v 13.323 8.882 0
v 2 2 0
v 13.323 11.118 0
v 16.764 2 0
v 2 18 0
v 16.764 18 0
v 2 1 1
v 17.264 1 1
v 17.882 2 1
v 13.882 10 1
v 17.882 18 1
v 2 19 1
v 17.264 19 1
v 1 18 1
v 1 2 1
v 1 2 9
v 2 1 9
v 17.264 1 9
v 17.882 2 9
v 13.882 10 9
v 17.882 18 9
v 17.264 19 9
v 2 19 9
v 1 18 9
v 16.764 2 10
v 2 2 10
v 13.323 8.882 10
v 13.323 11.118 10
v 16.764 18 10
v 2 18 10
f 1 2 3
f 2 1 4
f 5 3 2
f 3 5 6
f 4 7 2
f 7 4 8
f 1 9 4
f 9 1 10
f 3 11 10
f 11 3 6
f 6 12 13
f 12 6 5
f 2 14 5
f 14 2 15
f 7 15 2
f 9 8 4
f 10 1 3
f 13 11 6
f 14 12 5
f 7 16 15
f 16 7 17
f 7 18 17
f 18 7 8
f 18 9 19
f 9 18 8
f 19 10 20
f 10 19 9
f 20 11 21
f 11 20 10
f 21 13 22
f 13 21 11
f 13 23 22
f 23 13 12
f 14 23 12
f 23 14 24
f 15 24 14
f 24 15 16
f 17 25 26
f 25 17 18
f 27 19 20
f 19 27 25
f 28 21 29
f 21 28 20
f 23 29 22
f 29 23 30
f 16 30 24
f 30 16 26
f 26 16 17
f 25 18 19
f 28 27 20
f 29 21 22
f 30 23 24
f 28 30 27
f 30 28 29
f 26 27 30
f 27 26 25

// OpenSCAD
// file: ../functions/vectors2D.scad
/* * * * * * * * * * * * * * * * * * * * * * * * * * * * * * * * * * * * *\
 * Copyright (C) Claus Schrammel <claus@f05fk.net>                       *
 *                                                                       *
 * This program is free software: you can redistribute it and/or modify  *
 * it under the terms of the GNU General Public License as published by  *
 * the Free Software Foundation, either version 3 of the License, or     *
 * (at your option) any later version.                                   *
 *                                                                       *
 * This program is distributed in the hope that it will be useful,       *
 * but WITHOUT ANY WARRANTY; without even the implied warranty of        *
 * MERCHANTABILITY or FITNESS FOR A PARTICULAR PURPOSE.  See the         *
 * GNU General Public License for more details.                          *
 *                                                                       *
 * You should have received a copy of the GNU General Public License     *
 * along with this program.  If not, see <http://www.gnu.org/licenses/>. *
 *                                                                       *
 * SPDX-License-Identifier: GPL-3.0-or-later                             *
\* * * * * * * * * * * * * * * * * * * * * * * * * * * * * * * * * * * * */

include <utils.scad>

function normal_vector_2D(vector) = [-vector.y, vector.x];
function unit_vector_2D(vector) = vector / norm(vector);

/*
 * Calculates the coefficient for v1 to get from p1 to the intersection point of the two lines p1/v1 and p2/v2:
 * intersection_point = p1 + v1 * intersection_coefficient1.
 */
function intersection_coefficient1(p1, v1, p2, v2) = ( v2.x * (p1.y - p2.y) - v2.y * (p1.x - p2.x) ) / (v1.x * v2.y - v1.y * v2.x);

/*
 * Calculates the coefficient for v2 to get from p2 to the intersection point of the two lines p1/v1 and p2/v2:
 * intersection_point = p2 + v2 * intersection_coefficient2.
 */
function intersection_coefficient2(p1, v1, p2, v2) = intersection_coefficient1(p2, v2, p1, v1);

/*
 * Calculates the intersection point of the two lines p1/v1 and p2/v2.
 */
function intersection_point(p1, v1, p2, v2) = p1 + v1 * intersection_coefficient1(p1, v1, p2, v2);
// file: ../functions/utils.scad
/* * * * * * * * * * * * * * * * * * * * * * * * * * * * * * * * * * * * *\
 * Copyright (C) Claus Schrammel <claus@f05fk.net>                       *
 *                                                                       *
 * This program is free software: you can redistribute it and/or modify  *
 * it under the terms of the GNU General Public License as published by  *
 * the Free Software Foundation, either version 3 of the License, or     *
 * (at your option) any later version.                                   *
 *                                                                       *
 * This program is distributed in the hope that it will be useful,       *
 * but WITHOUT ANY WARRANTY; without even the implied warranty of        *
 * MERCHANTABILITY or FITNESS FOR A PARTICULAR PURPOSE.  See the         *
 * GNU General Public License for more details.                          *
 *                                                                       *
 * You should have received a copy of the GNU General Public License     *
 * along with this program.  If not, see <http://www.gnu.org/licenses/>. *
 *                                                                       *
 * SPDX-License-Identifier: GPL-3.0-or-later                             *
\* * * * * * * * * * * * * * * * * * * * * * * * * * * * * * * * * * * * */

// the modulo operator % creates negative results for negative inputs n
function modulo(n, m) = ((n % m) + m) % m;

function cyclic_array(array, index) = array[modulo(index, len(array))];
// file: ../functions/polygons.scad
/* * * * * * * * * * * * * * * * * * * * * * * * * * * * * * * * * * * * *\
 * Copyright (C) Claus Schrammel <claus@f05fk.net>                       *
 *                                                                       *
 * This program is free software: you can redistribute it and/or modify  *
 * it under the terms of the GNU General Public License as published by  *
 * the Free Software Foundation, either version 3 of the License, or     *
 * (at your option) any later version.                                   *
 *                                                                       *
 * This program is distributed in the hope that it will be useful,       *
 * but WITHOUT ANY WARRANTY; without even the implied warranty of        *
 * MERCHANTABILITY or FITNESS FOR A PARTICULAR PURPOSE.  See the         *
 * GNU General Public License for more details.                          *
 *                                                                       *
 * You should have received a copy of the GNU General Public License     *
 * along with this program.  If not, see <http://www.gnu.org/licenses/>. *
 *                                                                       *
 * SPDX-License-Identifier: GPL-3.0-or-later                             *
\* * * * * * * * * * * * * * * * * * * * * * * * * * * * * * * * * * * * */

include <utils.scad>
include <vectors2D.scad>

/*
 * Shrinks the polygon by moving the edges "inwards" by the given distance.
 * The points need to be given in the counter-clockwise order, i.e. applying the
 * right-hand rule with the thumb pointing in the z direction.
 */
function shrink_edges(points, distance) =
    [ for (i = [0 : 1 : len(points) - 1])
        let (p1 = cyclic_array(points, i - 1), p2 = cyclic_array(points, i), p3 = cyclic_array(points, i + 1),
                v1 = p2 - p1, v2 = p3 - p2,
                n1 = unit_vector_2D(normal_vector_2D(v1)), n2 = unit_vector_2D(normal_vector_2D(v2)))
            intersection_point(p1 + n1 * distance, v1, p2 + n2 * distance, v2)
    ];

/*
 * Grows the polygon by moving the edges "outwards" by the given distance.
 * The points need to be given in the counter-clockwise order, i.e. applying the
 * right-hand rule with the thumb pointing in the z direction.
 */
function grow_edges(points, distance) = shrink_edges(points, -distance);

/*
 * Flattens the corners of the polygon by cutting off at the intersection points where one of the edges
 * is moved "inwards" by the given distance, while the other edge is not, and vice-versa.
 * The points need to be given in the counter-clockwise order, i.e. applying the
 * right-hand rule with the thumb pointing in the z direction.
 */
function flatten_corners(points, distance) = 
    [ for (i = [0 : 1 : len(points) - 1])
        let (p1 = cyclic_array(points, i - 1), p2 = cyclic_array(points, i), p3 = cyclic_array(points, i + 1),
                v1 = p2 - p1, v2 = p3 - p2,
                n1 = unit_vector_2D(normal_vector_2D(v1)), n2 = unit_vector_2D(normal_vector_2D(v2)))
            each [
                intersection_point(p1, v1, p2 + n2 * distance, v2),
                intersection_point(p1 + n1 * distance, v1, p2, v2)
            ]
    ];
// main file
/* * * * * * * * * * * * * * * * * * * * * * * * * * * * * * * * * * * * *\
 * Copyright (C) Claus Schrammel <claus@f05fk.net>                       *
 *                                                                       *
 * This program is free software: you can redistribute it and/or modify  *
 * it under the terms of the GNU General Public License as published by  *
 * the Free Software Foundation, either version 3 of the License, or     *
 * (at your option) any later version.                                   *
 *                                                                       *
 * This program is distributed in the hope that it will be useful,       *
 * but WITHOUT ANY WARRANTY; without even the implied warranty of        *
 * MERCHANTABILITY or FITNESS FOR A PARTICULAR PURPOSE.  See the         *
 * GNU General Public License for more details.                          *
 *                                                                       *
 * You should have received a copy of the GNU General Public License     *
 * along with this program.  If not, see <http://www.gnu.org/licenses/>. *
 *                                                                       *
 * SPDX-License-Identifier: GPL-3.0-or-later                             *
\* * * * * * * * * * * * * * * * * * * * * * * * * * * * * * * * * * * * */

include <../functions/polygons.scad>

points = [[0, 0], [20, 0], [15, 10], [20, 20], [0, 20]];

PrismaChamfered(points = shrink_edges(points, 1), height = 10, chamfer = 1, invert_bottom = false, invert_middle = false, invert_top = false);

module PrismaChamfered(points, height, chamfer, invert_bottom = false, invert_middle = false, invert_top = false) {
    data = generate_data(points, chamfer, invert_bottom, invert_middle, invert_top);
    indexes = calculate_indexes(data);
    polyhedron(generate_poly_points(data, height, chamfer), generate_poly_faces(data, indexes), convexity = 10);
}

function generate_data(points, chamfer, invert_bottom = false, invert_middle = false, invert_top = false) = 
    [ for (i = [0 : 1 : len(points) - 1])
        let (p1 = cyclic_array(points, i - 1), p2 = cyclic_array(points, i), p3 = cyclic_array(points, i + 1),
                v1 = p2 - p1, v2 = p3 - p2,
                n1 = unit_vector_2D(normal_vector_2D(v1)), n2 = unit_vector_2D(normal_vector_2D(v2)),
                convex = cross(n1, n2))
        [

            // bottom

            if (convex > 0)
                if (invert_bottom)
                    if (intersection_coefficient1(p2,  v2, p1 - n1 * chamfer, v1) > -0.5 &&
                        intersection_coefficient1(p2, -v1, p2 - n2 * chamfer, v2) > -0.5)
                        [
                            intersection_point(p1 - n1 * chamfer, v1, p2,                v2),
                            intersection_point(p1,                v1, p2 - n2 * chamfer, v2),
                        ]
                    else
                        [
                            intersection_point(p1 - n1 * chamfer, v1, p2 - n2 * chamfer, v2),
                        ]
                else
                    [
                        intersection_point(p1 + n1 * chamfer, v1, p2 + n2 * chamfer, v2),
                    ]
            else // if (convex < 0)
                if (invert_bottom)
                    [
                        intersection_point(p1 - n1 * chamfer, v1, p2 - n2 * chamfer, v2),
                    ]
                else
                    if (intersection_coefficient1(p2,  v2, p1 + n1 * chamfer, v1) > -0.5 &&
                        intersection_coefficient1(p2, -v1, p2 + n2 * chamfer, v2) > -0.5)
                        [
                            intersection_point(p1 + n1 * chamfer, v1, p2,                v2),
                            intersection_point(p1,                v1, p2 + n2 * chamfer, v2),
                        ]
                    else
                        [
                            intersection_point(p1 + n1 * chamfer, v1, p2 + n2 * chamfer, v2),
                        ]
            ,

            // middle

            if (convex > 0 && !invert_middle
                    && intersection_coefficient1(p2, -v1, p2 + n2 * chamfer, v2) < 0.25
                    && intersection_coefficient1(p2,  v2, p1 + n1 * chamfer, v1) < 0.25)
                [
                    intersection_point(p1,                v1, p2 + n2 * chamfer, v2),
                    intersection_point(p1 + n1 * chamfer, v1, p2,                v2),
                ]
            else if (convex < 0 && invert_middle
                    && intersection_coefficient1(p2, -v1, p2 - n2 * chamfer, v2) < 0.25
                    && intersection_coefficient1(p2,  v2, p1 - n1 * chamfer, v1) < 0.25)
                [
                    intersection_point(p1,                v1, p2 - n2 * chamfer, v2),
                    intersection_point(p1 - n1 * chamfer, v1, p2,                v2),
                ]
            else
                [
                    intersection_point(p1,                v1, p2,                v2),
                ]
            ,

            // top

            if (convex > 0)
                if (invert_top)
                    if (intersection_coefficient1(p2,  v2, p1 - n1 * chamfer, v1) > -0.5 &&
                        intersection_coefficient1(p2, -v1, p2 - n2 * chamfer, v2) > -0.5)
                        [
                            intersection_point(p1 - n1 * chamfer, v1, p2,                v2),
                            intersection_point(p1,                v1, p2 - n2 * chamfer, v2),
                        ]
                    else
                        [
                            intersection_point(p1 - n1 * chamfer, v1, p2 - n2 * chamfer, v2),
                        ]
                else
                    [
                        intersection_point(p1 + n1 * chamfer, v1, p2 + n2 * chamfer, v2),
                    ]
            else // if (convex < 0)
                if (invert_top)
                    [
                        intersection_point(p1 - n1 * chamfer, v1, p2 - n2 * chamfer, v2),
                    ]
                else
                    if (intersection_coefficient1(p2,  v2, p1 + n1 * chamfer, v1) > -0.5 &&
                        intersection_coefficient1(p2, -v1, p2 + n2 * chamfer, v2) > -0.5)
                        [
                            intersection_point(p1 + n1 * chamfer, v1, p2,                v2),
                            intersection_point(p1,                v1, p2 + n2 * chamfer, v2),
                        ]
                    else
                        [
                            intersection_point(p1 + n1 * chamfer, v1, p2 + n2 * chamfer, v2),
                        ]

            ,

        ]

    ];

function calculate_indexes(data, index = 0, i = 0) =
    (i >= len(data)) ? [] :
    let (n0 = len(data[i][0]), n1 = len(data[i][1]), n2 = len(data[i][2]))
        concat([[index, index + n0, index + n0 + n1, index + n0 + 2 * n1]], calculate_indexes(data, index + n0 + 2 * n1 + n2, i + 1));

function generate_poly_points(data, height, chamfer) = 
    [ for (i = [0 : 1 : len(data) - 1])
        each [
            for (j = [0 : 1 : len(data[i][0]) - 1])
                [data[i][0][j].x, data[i][0][j].y,                0],
            for (j = [0 : 1 : len(data[i][1]) - 1])
                [data[i][1][j].x, data[i][1][j].y,          chamfer],
            for (j = [0 : 1 : len(data[i][1]) - 1])
                [data[i][1][j].x, data[i][1][j].y, height - chamfer],
            for (j = [0 : 1 : len(data[i][2]) - 1])
                [data[i][2][j].x, data[i][2][j].y, height          ],
        ]
    ];

function generate_poly_faces(data, indexes) = 
    [ 

        // bottom face

        [ for (i = [0 : 1 : len(data) - 1])
            if (len(data[i][0]) == 2)
                each [
                    indexes[i][0], indexes[i][0] + 1,
                ]
            else
                each [
                    indexes[i][0],
                ]
        ],

        // bottom row

        for (i = [0 : 1 : len(data) - 1])
            [indexes[i][0] + len(data[i][0]) - 1, indexes[i][1] + len(data[i][1]) - 1, indexes[(i + 1) % len(data)][1], indexes[(i + 1) % len(data)][0]]
        ,

        for (i = [0 : 1 : len(data) - 1])
            concat(
                [for (j = [len(data[i][0]) - 1 : -1 : 0]) indexes[i][0] + j],
                [for (j = [0 : 1 : len(data[i][1]) - 1])  indexes[i][1] + j]
            )
        ,

        // middle row

        for (i = [0 : 1 : len(data) - 1])
            if (len(data[i][1]) == 2)
                each [
                    [indexes[i][1],     indexes[i][2],     indexes[i][2] + 1, indexes[i][1] + 1],
                    [indexes[i][1] + 1, indexes[i][2] + 1, indexes[(i + 1) % len(data)][2], indexes[(i + 1) % len(data)][1]],
                ]
            else
                [indexes[i][1], indexes[i][2], indexes[(i + 1) % len(data)][2], indexes[(i + 1) % len(data)][1]]
        ,

        // top row

        for (i = [0 : 1 : len(data) - 1])
            [indexes[i][2] + len(data[i][1]) - 1, indexes[i][3] + len(data[i][2]) - 1, indexes[(i + 1) % len(data)][3], indexes[(i + 1) % len(data)][2]]
        ,

        for (i = [0 : 1 : len(data) - 1])
            concat(
                [for (j = [len(data[i][1]) - 1 : -1 : 0]) indexes[i][2] + j],
                [for (j = [0 : 1 : len(data[i][2]) - 1])  indexes[i][3] + j]
            )
        ,

        // top face

        [ for (i = [len(data) - 1 : -1 : 0])
            if (len(data[i][2]) == 2)
                each [
                    indexes[i][3] + 1, indexes[i][3],
                ]
            else
                each [
                    indexes[i][3],
                ]
        ],

    ];
